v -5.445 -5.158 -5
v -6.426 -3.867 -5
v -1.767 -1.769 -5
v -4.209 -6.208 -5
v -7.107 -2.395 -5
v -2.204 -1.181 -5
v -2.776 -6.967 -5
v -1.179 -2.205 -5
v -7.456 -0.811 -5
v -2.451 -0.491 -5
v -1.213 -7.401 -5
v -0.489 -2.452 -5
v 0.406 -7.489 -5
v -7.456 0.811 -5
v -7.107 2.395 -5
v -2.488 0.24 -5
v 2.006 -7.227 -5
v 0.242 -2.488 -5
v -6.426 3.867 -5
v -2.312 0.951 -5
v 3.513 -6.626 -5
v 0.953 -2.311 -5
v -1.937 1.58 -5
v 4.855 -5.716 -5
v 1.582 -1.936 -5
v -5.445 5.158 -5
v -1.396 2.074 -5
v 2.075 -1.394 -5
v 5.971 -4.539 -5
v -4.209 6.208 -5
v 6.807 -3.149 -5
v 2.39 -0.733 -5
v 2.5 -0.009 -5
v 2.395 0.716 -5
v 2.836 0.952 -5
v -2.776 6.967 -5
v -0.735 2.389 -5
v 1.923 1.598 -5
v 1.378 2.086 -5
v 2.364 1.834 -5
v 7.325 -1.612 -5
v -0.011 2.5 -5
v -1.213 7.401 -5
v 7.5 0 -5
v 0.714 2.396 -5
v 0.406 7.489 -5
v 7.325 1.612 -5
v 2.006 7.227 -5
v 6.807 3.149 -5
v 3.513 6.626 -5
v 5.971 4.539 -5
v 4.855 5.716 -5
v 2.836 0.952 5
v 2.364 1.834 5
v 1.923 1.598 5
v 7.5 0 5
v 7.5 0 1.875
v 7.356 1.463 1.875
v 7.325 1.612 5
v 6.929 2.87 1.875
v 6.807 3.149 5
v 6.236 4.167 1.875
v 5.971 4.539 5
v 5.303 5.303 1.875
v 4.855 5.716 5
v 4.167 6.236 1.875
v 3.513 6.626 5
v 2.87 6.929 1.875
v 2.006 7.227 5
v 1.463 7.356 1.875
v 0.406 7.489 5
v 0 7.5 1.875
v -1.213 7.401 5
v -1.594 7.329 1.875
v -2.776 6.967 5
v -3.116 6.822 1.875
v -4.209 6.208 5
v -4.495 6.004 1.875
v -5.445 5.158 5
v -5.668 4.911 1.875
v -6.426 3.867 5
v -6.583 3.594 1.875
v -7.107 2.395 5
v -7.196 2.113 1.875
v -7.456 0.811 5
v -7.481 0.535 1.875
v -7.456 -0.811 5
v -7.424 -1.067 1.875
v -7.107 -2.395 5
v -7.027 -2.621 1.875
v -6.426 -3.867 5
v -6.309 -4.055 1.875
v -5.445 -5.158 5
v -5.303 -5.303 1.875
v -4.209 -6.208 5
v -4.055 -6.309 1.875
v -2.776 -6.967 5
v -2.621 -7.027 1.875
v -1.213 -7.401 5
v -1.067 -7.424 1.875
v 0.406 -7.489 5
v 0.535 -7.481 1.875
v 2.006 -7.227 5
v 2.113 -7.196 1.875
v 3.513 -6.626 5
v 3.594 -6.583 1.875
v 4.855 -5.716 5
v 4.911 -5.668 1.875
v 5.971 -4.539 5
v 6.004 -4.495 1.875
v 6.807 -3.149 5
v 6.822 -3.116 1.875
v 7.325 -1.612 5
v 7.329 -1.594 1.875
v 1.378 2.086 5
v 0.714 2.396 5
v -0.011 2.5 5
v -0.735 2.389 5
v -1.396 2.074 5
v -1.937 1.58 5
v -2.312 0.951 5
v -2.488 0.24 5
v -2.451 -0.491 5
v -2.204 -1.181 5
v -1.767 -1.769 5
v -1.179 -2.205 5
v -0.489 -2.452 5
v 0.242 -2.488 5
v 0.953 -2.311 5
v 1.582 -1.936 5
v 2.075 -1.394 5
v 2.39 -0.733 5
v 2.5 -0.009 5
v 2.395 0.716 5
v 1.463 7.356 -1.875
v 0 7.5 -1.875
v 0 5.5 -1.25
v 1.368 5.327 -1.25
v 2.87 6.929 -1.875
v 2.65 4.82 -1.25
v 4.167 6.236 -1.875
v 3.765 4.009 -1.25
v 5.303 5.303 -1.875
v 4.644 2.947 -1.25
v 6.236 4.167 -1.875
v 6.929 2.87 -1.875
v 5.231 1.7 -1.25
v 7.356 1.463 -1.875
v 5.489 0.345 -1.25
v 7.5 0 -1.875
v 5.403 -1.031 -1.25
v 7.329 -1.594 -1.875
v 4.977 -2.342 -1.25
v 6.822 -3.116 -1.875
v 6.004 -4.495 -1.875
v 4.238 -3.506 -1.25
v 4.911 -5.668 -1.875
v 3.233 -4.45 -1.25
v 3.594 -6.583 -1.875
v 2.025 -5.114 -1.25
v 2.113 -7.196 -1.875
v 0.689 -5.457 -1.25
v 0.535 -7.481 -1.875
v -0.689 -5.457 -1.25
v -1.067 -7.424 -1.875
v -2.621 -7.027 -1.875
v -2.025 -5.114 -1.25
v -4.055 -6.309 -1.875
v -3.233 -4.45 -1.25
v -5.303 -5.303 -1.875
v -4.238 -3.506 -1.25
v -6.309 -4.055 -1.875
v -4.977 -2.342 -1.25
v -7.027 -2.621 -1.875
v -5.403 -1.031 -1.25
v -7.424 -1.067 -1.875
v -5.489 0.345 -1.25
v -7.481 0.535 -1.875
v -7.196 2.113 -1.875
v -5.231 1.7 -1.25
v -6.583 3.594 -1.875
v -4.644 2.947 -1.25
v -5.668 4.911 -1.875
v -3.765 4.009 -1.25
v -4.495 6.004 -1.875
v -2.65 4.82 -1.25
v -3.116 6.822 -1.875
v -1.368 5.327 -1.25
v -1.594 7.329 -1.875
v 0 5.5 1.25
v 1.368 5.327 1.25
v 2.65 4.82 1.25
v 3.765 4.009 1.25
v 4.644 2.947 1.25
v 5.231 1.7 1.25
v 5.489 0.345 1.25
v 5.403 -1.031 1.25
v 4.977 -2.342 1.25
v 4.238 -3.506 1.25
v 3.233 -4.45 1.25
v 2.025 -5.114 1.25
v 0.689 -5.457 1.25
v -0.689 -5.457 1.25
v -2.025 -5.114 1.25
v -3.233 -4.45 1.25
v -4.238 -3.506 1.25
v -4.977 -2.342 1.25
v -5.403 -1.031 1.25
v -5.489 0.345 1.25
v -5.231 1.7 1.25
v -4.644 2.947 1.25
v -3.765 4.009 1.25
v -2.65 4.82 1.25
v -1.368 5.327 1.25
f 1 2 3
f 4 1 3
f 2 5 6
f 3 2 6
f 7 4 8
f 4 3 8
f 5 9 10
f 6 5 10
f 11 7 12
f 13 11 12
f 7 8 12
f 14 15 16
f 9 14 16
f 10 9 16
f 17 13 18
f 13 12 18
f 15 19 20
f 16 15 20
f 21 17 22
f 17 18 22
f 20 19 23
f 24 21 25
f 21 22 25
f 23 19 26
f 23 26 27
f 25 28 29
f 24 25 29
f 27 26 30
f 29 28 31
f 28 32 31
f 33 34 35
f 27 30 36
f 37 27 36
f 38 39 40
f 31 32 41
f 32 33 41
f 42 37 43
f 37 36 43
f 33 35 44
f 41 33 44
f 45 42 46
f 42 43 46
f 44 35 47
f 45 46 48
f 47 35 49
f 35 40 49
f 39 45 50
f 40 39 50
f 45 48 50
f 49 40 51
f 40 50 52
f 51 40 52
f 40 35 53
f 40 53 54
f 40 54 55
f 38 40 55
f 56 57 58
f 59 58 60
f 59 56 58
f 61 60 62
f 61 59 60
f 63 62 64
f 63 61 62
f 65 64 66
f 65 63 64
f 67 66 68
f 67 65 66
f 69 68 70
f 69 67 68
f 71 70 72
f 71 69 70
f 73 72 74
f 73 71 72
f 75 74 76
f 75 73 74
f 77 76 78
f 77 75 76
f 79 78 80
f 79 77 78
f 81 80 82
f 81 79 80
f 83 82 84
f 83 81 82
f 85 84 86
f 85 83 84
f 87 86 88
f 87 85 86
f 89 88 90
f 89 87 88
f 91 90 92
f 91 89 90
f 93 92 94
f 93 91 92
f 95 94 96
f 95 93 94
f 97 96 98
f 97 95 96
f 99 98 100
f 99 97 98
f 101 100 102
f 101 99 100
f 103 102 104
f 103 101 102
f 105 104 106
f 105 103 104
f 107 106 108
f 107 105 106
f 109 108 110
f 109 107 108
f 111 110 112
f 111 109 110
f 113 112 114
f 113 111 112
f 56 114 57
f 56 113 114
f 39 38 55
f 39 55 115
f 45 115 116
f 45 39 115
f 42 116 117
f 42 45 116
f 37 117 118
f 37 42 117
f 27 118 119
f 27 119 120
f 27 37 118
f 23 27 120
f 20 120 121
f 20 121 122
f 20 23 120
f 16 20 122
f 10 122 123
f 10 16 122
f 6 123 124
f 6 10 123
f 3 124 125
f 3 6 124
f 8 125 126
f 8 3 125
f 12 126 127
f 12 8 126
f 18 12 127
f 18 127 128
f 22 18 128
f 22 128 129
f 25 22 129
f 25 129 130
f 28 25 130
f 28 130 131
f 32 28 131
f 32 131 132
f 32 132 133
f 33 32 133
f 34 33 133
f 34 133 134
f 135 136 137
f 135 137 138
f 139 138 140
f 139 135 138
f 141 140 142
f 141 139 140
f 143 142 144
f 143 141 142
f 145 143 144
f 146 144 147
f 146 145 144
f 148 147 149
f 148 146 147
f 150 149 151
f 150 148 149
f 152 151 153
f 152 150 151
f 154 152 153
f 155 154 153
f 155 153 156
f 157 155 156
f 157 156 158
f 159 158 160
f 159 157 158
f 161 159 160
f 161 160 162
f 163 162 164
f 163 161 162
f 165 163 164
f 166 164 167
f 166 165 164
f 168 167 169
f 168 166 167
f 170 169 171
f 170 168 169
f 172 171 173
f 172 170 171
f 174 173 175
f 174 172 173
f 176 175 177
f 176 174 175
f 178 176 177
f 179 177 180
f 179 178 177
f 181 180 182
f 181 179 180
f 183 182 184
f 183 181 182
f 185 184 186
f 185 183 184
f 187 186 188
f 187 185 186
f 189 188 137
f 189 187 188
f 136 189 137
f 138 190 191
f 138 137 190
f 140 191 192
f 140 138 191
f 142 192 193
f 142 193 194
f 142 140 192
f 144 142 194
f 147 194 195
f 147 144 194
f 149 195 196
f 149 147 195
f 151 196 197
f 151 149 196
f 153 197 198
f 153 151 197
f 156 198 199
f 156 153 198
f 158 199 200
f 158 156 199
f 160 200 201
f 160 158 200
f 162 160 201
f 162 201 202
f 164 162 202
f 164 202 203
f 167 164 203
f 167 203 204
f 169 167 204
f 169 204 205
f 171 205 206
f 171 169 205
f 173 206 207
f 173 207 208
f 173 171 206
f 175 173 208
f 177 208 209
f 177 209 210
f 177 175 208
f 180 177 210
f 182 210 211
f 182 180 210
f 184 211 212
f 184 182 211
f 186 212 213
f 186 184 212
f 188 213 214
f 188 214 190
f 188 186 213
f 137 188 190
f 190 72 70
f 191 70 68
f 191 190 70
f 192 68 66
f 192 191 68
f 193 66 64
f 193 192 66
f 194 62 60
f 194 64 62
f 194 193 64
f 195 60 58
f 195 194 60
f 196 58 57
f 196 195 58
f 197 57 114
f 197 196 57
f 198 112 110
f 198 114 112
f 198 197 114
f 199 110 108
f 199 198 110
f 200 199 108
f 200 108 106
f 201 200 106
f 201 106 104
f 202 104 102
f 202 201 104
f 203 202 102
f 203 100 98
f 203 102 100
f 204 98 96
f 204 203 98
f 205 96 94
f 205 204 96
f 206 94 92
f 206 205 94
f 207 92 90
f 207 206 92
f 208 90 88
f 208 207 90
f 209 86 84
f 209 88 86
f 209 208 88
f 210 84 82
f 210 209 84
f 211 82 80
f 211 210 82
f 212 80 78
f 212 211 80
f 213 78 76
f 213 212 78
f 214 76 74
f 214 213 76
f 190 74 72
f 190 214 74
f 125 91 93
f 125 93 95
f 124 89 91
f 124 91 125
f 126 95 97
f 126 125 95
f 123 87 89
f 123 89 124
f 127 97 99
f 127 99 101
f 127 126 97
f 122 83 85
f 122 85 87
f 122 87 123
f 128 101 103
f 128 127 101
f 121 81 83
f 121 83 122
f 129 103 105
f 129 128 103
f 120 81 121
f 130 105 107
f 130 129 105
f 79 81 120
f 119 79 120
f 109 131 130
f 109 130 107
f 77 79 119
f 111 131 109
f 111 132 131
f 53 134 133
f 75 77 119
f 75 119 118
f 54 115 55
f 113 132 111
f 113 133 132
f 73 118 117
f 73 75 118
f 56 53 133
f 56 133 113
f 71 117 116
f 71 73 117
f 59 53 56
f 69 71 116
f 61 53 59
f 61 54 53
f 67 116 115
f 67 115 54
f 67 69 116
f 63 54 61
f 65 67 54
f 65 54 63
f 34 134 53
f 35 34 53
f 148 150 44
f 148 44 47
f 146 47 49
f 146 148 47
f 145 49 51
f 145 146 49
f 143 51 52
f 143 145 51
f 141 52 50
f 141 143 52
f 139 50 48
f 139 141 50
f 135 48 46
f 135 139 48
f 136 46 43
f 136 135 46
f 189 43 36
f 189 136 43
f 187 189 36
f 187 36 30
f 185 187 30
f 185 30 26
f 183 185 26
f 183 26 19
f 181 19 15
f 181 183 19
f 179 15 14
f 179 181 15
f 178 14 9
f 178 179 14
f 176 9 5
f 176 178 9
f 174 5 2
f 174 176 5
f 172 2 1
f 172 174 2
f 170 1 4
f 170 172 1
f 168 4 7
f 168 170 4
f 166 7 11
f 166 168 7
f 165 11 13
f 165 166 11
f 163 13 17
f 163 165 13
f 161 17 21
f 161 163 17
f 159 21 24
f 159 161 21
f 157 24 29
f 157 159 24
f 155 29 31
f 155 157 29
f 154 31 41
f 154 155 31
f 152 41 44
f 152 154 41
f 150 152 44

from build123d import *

# Parameters (mm, degrees)
SKETCH1_R           = 7.5
SKETCH1_R_2         = 2.5
BOSS_EXTRUDE1_DEPTH = 5
CUT_EXTRUDE1_DEPTH  = 10


with BuildPart() as part:
    # Sketch1 → Boss-Extrude1 (new body, symmetric)
    with BuildSketch(Plane.XY):
        Circle(SKETCH1_R)
        Circle(SKETCH1_R_2, mode=Mode.SUBTRACT)
    extrude(amount=BOSS_EXTRUDE1_DEPTH, both=True)

    # Sketch3 → Cut-Revolve1 (revolve, cut)
    with BuildSketch(Plane(origin=(0, 0, 0), x_dir=(0, 0, -1), z_dir=(1, 0, 0))):
        Polygon((-2.5, 9.5), (-1.25, 5.5), (1.25, 5.5), (2.5, 9.5), align=None)
    revolve(axis=Axis((0, 0, 9.747557678), (0, 0, -1)), mode=Mode.SUBTRACT)

    # Sketch4 → Cut-Extrude1 (cut)
    with BuildSketch(Plane(origin=(0, 0, -5), x_dir=(-1, 0, 0), z_dir=(0, 0, -1))):
        with BuildLine():
            Line((-2.395260625, 0.716049259), (-2.835991961, 0.952176109))
            Line((-2.835991961, 0.952176109), (-2.36373826, 1.833638781))
            Line((-2.36373826, 1.833638781), (-1.923006924, 1.597511931))
            ThreePointArc((-1.923006924, 1.597511931), (-2.203656681, 1.180634251), (-2.395260625, 0.716049259))
        make_face()
    extrude(amount=-CUT_EXTRUDE1_DEPTH, mode=Mode.SUBTRACT)


solid = part.part
